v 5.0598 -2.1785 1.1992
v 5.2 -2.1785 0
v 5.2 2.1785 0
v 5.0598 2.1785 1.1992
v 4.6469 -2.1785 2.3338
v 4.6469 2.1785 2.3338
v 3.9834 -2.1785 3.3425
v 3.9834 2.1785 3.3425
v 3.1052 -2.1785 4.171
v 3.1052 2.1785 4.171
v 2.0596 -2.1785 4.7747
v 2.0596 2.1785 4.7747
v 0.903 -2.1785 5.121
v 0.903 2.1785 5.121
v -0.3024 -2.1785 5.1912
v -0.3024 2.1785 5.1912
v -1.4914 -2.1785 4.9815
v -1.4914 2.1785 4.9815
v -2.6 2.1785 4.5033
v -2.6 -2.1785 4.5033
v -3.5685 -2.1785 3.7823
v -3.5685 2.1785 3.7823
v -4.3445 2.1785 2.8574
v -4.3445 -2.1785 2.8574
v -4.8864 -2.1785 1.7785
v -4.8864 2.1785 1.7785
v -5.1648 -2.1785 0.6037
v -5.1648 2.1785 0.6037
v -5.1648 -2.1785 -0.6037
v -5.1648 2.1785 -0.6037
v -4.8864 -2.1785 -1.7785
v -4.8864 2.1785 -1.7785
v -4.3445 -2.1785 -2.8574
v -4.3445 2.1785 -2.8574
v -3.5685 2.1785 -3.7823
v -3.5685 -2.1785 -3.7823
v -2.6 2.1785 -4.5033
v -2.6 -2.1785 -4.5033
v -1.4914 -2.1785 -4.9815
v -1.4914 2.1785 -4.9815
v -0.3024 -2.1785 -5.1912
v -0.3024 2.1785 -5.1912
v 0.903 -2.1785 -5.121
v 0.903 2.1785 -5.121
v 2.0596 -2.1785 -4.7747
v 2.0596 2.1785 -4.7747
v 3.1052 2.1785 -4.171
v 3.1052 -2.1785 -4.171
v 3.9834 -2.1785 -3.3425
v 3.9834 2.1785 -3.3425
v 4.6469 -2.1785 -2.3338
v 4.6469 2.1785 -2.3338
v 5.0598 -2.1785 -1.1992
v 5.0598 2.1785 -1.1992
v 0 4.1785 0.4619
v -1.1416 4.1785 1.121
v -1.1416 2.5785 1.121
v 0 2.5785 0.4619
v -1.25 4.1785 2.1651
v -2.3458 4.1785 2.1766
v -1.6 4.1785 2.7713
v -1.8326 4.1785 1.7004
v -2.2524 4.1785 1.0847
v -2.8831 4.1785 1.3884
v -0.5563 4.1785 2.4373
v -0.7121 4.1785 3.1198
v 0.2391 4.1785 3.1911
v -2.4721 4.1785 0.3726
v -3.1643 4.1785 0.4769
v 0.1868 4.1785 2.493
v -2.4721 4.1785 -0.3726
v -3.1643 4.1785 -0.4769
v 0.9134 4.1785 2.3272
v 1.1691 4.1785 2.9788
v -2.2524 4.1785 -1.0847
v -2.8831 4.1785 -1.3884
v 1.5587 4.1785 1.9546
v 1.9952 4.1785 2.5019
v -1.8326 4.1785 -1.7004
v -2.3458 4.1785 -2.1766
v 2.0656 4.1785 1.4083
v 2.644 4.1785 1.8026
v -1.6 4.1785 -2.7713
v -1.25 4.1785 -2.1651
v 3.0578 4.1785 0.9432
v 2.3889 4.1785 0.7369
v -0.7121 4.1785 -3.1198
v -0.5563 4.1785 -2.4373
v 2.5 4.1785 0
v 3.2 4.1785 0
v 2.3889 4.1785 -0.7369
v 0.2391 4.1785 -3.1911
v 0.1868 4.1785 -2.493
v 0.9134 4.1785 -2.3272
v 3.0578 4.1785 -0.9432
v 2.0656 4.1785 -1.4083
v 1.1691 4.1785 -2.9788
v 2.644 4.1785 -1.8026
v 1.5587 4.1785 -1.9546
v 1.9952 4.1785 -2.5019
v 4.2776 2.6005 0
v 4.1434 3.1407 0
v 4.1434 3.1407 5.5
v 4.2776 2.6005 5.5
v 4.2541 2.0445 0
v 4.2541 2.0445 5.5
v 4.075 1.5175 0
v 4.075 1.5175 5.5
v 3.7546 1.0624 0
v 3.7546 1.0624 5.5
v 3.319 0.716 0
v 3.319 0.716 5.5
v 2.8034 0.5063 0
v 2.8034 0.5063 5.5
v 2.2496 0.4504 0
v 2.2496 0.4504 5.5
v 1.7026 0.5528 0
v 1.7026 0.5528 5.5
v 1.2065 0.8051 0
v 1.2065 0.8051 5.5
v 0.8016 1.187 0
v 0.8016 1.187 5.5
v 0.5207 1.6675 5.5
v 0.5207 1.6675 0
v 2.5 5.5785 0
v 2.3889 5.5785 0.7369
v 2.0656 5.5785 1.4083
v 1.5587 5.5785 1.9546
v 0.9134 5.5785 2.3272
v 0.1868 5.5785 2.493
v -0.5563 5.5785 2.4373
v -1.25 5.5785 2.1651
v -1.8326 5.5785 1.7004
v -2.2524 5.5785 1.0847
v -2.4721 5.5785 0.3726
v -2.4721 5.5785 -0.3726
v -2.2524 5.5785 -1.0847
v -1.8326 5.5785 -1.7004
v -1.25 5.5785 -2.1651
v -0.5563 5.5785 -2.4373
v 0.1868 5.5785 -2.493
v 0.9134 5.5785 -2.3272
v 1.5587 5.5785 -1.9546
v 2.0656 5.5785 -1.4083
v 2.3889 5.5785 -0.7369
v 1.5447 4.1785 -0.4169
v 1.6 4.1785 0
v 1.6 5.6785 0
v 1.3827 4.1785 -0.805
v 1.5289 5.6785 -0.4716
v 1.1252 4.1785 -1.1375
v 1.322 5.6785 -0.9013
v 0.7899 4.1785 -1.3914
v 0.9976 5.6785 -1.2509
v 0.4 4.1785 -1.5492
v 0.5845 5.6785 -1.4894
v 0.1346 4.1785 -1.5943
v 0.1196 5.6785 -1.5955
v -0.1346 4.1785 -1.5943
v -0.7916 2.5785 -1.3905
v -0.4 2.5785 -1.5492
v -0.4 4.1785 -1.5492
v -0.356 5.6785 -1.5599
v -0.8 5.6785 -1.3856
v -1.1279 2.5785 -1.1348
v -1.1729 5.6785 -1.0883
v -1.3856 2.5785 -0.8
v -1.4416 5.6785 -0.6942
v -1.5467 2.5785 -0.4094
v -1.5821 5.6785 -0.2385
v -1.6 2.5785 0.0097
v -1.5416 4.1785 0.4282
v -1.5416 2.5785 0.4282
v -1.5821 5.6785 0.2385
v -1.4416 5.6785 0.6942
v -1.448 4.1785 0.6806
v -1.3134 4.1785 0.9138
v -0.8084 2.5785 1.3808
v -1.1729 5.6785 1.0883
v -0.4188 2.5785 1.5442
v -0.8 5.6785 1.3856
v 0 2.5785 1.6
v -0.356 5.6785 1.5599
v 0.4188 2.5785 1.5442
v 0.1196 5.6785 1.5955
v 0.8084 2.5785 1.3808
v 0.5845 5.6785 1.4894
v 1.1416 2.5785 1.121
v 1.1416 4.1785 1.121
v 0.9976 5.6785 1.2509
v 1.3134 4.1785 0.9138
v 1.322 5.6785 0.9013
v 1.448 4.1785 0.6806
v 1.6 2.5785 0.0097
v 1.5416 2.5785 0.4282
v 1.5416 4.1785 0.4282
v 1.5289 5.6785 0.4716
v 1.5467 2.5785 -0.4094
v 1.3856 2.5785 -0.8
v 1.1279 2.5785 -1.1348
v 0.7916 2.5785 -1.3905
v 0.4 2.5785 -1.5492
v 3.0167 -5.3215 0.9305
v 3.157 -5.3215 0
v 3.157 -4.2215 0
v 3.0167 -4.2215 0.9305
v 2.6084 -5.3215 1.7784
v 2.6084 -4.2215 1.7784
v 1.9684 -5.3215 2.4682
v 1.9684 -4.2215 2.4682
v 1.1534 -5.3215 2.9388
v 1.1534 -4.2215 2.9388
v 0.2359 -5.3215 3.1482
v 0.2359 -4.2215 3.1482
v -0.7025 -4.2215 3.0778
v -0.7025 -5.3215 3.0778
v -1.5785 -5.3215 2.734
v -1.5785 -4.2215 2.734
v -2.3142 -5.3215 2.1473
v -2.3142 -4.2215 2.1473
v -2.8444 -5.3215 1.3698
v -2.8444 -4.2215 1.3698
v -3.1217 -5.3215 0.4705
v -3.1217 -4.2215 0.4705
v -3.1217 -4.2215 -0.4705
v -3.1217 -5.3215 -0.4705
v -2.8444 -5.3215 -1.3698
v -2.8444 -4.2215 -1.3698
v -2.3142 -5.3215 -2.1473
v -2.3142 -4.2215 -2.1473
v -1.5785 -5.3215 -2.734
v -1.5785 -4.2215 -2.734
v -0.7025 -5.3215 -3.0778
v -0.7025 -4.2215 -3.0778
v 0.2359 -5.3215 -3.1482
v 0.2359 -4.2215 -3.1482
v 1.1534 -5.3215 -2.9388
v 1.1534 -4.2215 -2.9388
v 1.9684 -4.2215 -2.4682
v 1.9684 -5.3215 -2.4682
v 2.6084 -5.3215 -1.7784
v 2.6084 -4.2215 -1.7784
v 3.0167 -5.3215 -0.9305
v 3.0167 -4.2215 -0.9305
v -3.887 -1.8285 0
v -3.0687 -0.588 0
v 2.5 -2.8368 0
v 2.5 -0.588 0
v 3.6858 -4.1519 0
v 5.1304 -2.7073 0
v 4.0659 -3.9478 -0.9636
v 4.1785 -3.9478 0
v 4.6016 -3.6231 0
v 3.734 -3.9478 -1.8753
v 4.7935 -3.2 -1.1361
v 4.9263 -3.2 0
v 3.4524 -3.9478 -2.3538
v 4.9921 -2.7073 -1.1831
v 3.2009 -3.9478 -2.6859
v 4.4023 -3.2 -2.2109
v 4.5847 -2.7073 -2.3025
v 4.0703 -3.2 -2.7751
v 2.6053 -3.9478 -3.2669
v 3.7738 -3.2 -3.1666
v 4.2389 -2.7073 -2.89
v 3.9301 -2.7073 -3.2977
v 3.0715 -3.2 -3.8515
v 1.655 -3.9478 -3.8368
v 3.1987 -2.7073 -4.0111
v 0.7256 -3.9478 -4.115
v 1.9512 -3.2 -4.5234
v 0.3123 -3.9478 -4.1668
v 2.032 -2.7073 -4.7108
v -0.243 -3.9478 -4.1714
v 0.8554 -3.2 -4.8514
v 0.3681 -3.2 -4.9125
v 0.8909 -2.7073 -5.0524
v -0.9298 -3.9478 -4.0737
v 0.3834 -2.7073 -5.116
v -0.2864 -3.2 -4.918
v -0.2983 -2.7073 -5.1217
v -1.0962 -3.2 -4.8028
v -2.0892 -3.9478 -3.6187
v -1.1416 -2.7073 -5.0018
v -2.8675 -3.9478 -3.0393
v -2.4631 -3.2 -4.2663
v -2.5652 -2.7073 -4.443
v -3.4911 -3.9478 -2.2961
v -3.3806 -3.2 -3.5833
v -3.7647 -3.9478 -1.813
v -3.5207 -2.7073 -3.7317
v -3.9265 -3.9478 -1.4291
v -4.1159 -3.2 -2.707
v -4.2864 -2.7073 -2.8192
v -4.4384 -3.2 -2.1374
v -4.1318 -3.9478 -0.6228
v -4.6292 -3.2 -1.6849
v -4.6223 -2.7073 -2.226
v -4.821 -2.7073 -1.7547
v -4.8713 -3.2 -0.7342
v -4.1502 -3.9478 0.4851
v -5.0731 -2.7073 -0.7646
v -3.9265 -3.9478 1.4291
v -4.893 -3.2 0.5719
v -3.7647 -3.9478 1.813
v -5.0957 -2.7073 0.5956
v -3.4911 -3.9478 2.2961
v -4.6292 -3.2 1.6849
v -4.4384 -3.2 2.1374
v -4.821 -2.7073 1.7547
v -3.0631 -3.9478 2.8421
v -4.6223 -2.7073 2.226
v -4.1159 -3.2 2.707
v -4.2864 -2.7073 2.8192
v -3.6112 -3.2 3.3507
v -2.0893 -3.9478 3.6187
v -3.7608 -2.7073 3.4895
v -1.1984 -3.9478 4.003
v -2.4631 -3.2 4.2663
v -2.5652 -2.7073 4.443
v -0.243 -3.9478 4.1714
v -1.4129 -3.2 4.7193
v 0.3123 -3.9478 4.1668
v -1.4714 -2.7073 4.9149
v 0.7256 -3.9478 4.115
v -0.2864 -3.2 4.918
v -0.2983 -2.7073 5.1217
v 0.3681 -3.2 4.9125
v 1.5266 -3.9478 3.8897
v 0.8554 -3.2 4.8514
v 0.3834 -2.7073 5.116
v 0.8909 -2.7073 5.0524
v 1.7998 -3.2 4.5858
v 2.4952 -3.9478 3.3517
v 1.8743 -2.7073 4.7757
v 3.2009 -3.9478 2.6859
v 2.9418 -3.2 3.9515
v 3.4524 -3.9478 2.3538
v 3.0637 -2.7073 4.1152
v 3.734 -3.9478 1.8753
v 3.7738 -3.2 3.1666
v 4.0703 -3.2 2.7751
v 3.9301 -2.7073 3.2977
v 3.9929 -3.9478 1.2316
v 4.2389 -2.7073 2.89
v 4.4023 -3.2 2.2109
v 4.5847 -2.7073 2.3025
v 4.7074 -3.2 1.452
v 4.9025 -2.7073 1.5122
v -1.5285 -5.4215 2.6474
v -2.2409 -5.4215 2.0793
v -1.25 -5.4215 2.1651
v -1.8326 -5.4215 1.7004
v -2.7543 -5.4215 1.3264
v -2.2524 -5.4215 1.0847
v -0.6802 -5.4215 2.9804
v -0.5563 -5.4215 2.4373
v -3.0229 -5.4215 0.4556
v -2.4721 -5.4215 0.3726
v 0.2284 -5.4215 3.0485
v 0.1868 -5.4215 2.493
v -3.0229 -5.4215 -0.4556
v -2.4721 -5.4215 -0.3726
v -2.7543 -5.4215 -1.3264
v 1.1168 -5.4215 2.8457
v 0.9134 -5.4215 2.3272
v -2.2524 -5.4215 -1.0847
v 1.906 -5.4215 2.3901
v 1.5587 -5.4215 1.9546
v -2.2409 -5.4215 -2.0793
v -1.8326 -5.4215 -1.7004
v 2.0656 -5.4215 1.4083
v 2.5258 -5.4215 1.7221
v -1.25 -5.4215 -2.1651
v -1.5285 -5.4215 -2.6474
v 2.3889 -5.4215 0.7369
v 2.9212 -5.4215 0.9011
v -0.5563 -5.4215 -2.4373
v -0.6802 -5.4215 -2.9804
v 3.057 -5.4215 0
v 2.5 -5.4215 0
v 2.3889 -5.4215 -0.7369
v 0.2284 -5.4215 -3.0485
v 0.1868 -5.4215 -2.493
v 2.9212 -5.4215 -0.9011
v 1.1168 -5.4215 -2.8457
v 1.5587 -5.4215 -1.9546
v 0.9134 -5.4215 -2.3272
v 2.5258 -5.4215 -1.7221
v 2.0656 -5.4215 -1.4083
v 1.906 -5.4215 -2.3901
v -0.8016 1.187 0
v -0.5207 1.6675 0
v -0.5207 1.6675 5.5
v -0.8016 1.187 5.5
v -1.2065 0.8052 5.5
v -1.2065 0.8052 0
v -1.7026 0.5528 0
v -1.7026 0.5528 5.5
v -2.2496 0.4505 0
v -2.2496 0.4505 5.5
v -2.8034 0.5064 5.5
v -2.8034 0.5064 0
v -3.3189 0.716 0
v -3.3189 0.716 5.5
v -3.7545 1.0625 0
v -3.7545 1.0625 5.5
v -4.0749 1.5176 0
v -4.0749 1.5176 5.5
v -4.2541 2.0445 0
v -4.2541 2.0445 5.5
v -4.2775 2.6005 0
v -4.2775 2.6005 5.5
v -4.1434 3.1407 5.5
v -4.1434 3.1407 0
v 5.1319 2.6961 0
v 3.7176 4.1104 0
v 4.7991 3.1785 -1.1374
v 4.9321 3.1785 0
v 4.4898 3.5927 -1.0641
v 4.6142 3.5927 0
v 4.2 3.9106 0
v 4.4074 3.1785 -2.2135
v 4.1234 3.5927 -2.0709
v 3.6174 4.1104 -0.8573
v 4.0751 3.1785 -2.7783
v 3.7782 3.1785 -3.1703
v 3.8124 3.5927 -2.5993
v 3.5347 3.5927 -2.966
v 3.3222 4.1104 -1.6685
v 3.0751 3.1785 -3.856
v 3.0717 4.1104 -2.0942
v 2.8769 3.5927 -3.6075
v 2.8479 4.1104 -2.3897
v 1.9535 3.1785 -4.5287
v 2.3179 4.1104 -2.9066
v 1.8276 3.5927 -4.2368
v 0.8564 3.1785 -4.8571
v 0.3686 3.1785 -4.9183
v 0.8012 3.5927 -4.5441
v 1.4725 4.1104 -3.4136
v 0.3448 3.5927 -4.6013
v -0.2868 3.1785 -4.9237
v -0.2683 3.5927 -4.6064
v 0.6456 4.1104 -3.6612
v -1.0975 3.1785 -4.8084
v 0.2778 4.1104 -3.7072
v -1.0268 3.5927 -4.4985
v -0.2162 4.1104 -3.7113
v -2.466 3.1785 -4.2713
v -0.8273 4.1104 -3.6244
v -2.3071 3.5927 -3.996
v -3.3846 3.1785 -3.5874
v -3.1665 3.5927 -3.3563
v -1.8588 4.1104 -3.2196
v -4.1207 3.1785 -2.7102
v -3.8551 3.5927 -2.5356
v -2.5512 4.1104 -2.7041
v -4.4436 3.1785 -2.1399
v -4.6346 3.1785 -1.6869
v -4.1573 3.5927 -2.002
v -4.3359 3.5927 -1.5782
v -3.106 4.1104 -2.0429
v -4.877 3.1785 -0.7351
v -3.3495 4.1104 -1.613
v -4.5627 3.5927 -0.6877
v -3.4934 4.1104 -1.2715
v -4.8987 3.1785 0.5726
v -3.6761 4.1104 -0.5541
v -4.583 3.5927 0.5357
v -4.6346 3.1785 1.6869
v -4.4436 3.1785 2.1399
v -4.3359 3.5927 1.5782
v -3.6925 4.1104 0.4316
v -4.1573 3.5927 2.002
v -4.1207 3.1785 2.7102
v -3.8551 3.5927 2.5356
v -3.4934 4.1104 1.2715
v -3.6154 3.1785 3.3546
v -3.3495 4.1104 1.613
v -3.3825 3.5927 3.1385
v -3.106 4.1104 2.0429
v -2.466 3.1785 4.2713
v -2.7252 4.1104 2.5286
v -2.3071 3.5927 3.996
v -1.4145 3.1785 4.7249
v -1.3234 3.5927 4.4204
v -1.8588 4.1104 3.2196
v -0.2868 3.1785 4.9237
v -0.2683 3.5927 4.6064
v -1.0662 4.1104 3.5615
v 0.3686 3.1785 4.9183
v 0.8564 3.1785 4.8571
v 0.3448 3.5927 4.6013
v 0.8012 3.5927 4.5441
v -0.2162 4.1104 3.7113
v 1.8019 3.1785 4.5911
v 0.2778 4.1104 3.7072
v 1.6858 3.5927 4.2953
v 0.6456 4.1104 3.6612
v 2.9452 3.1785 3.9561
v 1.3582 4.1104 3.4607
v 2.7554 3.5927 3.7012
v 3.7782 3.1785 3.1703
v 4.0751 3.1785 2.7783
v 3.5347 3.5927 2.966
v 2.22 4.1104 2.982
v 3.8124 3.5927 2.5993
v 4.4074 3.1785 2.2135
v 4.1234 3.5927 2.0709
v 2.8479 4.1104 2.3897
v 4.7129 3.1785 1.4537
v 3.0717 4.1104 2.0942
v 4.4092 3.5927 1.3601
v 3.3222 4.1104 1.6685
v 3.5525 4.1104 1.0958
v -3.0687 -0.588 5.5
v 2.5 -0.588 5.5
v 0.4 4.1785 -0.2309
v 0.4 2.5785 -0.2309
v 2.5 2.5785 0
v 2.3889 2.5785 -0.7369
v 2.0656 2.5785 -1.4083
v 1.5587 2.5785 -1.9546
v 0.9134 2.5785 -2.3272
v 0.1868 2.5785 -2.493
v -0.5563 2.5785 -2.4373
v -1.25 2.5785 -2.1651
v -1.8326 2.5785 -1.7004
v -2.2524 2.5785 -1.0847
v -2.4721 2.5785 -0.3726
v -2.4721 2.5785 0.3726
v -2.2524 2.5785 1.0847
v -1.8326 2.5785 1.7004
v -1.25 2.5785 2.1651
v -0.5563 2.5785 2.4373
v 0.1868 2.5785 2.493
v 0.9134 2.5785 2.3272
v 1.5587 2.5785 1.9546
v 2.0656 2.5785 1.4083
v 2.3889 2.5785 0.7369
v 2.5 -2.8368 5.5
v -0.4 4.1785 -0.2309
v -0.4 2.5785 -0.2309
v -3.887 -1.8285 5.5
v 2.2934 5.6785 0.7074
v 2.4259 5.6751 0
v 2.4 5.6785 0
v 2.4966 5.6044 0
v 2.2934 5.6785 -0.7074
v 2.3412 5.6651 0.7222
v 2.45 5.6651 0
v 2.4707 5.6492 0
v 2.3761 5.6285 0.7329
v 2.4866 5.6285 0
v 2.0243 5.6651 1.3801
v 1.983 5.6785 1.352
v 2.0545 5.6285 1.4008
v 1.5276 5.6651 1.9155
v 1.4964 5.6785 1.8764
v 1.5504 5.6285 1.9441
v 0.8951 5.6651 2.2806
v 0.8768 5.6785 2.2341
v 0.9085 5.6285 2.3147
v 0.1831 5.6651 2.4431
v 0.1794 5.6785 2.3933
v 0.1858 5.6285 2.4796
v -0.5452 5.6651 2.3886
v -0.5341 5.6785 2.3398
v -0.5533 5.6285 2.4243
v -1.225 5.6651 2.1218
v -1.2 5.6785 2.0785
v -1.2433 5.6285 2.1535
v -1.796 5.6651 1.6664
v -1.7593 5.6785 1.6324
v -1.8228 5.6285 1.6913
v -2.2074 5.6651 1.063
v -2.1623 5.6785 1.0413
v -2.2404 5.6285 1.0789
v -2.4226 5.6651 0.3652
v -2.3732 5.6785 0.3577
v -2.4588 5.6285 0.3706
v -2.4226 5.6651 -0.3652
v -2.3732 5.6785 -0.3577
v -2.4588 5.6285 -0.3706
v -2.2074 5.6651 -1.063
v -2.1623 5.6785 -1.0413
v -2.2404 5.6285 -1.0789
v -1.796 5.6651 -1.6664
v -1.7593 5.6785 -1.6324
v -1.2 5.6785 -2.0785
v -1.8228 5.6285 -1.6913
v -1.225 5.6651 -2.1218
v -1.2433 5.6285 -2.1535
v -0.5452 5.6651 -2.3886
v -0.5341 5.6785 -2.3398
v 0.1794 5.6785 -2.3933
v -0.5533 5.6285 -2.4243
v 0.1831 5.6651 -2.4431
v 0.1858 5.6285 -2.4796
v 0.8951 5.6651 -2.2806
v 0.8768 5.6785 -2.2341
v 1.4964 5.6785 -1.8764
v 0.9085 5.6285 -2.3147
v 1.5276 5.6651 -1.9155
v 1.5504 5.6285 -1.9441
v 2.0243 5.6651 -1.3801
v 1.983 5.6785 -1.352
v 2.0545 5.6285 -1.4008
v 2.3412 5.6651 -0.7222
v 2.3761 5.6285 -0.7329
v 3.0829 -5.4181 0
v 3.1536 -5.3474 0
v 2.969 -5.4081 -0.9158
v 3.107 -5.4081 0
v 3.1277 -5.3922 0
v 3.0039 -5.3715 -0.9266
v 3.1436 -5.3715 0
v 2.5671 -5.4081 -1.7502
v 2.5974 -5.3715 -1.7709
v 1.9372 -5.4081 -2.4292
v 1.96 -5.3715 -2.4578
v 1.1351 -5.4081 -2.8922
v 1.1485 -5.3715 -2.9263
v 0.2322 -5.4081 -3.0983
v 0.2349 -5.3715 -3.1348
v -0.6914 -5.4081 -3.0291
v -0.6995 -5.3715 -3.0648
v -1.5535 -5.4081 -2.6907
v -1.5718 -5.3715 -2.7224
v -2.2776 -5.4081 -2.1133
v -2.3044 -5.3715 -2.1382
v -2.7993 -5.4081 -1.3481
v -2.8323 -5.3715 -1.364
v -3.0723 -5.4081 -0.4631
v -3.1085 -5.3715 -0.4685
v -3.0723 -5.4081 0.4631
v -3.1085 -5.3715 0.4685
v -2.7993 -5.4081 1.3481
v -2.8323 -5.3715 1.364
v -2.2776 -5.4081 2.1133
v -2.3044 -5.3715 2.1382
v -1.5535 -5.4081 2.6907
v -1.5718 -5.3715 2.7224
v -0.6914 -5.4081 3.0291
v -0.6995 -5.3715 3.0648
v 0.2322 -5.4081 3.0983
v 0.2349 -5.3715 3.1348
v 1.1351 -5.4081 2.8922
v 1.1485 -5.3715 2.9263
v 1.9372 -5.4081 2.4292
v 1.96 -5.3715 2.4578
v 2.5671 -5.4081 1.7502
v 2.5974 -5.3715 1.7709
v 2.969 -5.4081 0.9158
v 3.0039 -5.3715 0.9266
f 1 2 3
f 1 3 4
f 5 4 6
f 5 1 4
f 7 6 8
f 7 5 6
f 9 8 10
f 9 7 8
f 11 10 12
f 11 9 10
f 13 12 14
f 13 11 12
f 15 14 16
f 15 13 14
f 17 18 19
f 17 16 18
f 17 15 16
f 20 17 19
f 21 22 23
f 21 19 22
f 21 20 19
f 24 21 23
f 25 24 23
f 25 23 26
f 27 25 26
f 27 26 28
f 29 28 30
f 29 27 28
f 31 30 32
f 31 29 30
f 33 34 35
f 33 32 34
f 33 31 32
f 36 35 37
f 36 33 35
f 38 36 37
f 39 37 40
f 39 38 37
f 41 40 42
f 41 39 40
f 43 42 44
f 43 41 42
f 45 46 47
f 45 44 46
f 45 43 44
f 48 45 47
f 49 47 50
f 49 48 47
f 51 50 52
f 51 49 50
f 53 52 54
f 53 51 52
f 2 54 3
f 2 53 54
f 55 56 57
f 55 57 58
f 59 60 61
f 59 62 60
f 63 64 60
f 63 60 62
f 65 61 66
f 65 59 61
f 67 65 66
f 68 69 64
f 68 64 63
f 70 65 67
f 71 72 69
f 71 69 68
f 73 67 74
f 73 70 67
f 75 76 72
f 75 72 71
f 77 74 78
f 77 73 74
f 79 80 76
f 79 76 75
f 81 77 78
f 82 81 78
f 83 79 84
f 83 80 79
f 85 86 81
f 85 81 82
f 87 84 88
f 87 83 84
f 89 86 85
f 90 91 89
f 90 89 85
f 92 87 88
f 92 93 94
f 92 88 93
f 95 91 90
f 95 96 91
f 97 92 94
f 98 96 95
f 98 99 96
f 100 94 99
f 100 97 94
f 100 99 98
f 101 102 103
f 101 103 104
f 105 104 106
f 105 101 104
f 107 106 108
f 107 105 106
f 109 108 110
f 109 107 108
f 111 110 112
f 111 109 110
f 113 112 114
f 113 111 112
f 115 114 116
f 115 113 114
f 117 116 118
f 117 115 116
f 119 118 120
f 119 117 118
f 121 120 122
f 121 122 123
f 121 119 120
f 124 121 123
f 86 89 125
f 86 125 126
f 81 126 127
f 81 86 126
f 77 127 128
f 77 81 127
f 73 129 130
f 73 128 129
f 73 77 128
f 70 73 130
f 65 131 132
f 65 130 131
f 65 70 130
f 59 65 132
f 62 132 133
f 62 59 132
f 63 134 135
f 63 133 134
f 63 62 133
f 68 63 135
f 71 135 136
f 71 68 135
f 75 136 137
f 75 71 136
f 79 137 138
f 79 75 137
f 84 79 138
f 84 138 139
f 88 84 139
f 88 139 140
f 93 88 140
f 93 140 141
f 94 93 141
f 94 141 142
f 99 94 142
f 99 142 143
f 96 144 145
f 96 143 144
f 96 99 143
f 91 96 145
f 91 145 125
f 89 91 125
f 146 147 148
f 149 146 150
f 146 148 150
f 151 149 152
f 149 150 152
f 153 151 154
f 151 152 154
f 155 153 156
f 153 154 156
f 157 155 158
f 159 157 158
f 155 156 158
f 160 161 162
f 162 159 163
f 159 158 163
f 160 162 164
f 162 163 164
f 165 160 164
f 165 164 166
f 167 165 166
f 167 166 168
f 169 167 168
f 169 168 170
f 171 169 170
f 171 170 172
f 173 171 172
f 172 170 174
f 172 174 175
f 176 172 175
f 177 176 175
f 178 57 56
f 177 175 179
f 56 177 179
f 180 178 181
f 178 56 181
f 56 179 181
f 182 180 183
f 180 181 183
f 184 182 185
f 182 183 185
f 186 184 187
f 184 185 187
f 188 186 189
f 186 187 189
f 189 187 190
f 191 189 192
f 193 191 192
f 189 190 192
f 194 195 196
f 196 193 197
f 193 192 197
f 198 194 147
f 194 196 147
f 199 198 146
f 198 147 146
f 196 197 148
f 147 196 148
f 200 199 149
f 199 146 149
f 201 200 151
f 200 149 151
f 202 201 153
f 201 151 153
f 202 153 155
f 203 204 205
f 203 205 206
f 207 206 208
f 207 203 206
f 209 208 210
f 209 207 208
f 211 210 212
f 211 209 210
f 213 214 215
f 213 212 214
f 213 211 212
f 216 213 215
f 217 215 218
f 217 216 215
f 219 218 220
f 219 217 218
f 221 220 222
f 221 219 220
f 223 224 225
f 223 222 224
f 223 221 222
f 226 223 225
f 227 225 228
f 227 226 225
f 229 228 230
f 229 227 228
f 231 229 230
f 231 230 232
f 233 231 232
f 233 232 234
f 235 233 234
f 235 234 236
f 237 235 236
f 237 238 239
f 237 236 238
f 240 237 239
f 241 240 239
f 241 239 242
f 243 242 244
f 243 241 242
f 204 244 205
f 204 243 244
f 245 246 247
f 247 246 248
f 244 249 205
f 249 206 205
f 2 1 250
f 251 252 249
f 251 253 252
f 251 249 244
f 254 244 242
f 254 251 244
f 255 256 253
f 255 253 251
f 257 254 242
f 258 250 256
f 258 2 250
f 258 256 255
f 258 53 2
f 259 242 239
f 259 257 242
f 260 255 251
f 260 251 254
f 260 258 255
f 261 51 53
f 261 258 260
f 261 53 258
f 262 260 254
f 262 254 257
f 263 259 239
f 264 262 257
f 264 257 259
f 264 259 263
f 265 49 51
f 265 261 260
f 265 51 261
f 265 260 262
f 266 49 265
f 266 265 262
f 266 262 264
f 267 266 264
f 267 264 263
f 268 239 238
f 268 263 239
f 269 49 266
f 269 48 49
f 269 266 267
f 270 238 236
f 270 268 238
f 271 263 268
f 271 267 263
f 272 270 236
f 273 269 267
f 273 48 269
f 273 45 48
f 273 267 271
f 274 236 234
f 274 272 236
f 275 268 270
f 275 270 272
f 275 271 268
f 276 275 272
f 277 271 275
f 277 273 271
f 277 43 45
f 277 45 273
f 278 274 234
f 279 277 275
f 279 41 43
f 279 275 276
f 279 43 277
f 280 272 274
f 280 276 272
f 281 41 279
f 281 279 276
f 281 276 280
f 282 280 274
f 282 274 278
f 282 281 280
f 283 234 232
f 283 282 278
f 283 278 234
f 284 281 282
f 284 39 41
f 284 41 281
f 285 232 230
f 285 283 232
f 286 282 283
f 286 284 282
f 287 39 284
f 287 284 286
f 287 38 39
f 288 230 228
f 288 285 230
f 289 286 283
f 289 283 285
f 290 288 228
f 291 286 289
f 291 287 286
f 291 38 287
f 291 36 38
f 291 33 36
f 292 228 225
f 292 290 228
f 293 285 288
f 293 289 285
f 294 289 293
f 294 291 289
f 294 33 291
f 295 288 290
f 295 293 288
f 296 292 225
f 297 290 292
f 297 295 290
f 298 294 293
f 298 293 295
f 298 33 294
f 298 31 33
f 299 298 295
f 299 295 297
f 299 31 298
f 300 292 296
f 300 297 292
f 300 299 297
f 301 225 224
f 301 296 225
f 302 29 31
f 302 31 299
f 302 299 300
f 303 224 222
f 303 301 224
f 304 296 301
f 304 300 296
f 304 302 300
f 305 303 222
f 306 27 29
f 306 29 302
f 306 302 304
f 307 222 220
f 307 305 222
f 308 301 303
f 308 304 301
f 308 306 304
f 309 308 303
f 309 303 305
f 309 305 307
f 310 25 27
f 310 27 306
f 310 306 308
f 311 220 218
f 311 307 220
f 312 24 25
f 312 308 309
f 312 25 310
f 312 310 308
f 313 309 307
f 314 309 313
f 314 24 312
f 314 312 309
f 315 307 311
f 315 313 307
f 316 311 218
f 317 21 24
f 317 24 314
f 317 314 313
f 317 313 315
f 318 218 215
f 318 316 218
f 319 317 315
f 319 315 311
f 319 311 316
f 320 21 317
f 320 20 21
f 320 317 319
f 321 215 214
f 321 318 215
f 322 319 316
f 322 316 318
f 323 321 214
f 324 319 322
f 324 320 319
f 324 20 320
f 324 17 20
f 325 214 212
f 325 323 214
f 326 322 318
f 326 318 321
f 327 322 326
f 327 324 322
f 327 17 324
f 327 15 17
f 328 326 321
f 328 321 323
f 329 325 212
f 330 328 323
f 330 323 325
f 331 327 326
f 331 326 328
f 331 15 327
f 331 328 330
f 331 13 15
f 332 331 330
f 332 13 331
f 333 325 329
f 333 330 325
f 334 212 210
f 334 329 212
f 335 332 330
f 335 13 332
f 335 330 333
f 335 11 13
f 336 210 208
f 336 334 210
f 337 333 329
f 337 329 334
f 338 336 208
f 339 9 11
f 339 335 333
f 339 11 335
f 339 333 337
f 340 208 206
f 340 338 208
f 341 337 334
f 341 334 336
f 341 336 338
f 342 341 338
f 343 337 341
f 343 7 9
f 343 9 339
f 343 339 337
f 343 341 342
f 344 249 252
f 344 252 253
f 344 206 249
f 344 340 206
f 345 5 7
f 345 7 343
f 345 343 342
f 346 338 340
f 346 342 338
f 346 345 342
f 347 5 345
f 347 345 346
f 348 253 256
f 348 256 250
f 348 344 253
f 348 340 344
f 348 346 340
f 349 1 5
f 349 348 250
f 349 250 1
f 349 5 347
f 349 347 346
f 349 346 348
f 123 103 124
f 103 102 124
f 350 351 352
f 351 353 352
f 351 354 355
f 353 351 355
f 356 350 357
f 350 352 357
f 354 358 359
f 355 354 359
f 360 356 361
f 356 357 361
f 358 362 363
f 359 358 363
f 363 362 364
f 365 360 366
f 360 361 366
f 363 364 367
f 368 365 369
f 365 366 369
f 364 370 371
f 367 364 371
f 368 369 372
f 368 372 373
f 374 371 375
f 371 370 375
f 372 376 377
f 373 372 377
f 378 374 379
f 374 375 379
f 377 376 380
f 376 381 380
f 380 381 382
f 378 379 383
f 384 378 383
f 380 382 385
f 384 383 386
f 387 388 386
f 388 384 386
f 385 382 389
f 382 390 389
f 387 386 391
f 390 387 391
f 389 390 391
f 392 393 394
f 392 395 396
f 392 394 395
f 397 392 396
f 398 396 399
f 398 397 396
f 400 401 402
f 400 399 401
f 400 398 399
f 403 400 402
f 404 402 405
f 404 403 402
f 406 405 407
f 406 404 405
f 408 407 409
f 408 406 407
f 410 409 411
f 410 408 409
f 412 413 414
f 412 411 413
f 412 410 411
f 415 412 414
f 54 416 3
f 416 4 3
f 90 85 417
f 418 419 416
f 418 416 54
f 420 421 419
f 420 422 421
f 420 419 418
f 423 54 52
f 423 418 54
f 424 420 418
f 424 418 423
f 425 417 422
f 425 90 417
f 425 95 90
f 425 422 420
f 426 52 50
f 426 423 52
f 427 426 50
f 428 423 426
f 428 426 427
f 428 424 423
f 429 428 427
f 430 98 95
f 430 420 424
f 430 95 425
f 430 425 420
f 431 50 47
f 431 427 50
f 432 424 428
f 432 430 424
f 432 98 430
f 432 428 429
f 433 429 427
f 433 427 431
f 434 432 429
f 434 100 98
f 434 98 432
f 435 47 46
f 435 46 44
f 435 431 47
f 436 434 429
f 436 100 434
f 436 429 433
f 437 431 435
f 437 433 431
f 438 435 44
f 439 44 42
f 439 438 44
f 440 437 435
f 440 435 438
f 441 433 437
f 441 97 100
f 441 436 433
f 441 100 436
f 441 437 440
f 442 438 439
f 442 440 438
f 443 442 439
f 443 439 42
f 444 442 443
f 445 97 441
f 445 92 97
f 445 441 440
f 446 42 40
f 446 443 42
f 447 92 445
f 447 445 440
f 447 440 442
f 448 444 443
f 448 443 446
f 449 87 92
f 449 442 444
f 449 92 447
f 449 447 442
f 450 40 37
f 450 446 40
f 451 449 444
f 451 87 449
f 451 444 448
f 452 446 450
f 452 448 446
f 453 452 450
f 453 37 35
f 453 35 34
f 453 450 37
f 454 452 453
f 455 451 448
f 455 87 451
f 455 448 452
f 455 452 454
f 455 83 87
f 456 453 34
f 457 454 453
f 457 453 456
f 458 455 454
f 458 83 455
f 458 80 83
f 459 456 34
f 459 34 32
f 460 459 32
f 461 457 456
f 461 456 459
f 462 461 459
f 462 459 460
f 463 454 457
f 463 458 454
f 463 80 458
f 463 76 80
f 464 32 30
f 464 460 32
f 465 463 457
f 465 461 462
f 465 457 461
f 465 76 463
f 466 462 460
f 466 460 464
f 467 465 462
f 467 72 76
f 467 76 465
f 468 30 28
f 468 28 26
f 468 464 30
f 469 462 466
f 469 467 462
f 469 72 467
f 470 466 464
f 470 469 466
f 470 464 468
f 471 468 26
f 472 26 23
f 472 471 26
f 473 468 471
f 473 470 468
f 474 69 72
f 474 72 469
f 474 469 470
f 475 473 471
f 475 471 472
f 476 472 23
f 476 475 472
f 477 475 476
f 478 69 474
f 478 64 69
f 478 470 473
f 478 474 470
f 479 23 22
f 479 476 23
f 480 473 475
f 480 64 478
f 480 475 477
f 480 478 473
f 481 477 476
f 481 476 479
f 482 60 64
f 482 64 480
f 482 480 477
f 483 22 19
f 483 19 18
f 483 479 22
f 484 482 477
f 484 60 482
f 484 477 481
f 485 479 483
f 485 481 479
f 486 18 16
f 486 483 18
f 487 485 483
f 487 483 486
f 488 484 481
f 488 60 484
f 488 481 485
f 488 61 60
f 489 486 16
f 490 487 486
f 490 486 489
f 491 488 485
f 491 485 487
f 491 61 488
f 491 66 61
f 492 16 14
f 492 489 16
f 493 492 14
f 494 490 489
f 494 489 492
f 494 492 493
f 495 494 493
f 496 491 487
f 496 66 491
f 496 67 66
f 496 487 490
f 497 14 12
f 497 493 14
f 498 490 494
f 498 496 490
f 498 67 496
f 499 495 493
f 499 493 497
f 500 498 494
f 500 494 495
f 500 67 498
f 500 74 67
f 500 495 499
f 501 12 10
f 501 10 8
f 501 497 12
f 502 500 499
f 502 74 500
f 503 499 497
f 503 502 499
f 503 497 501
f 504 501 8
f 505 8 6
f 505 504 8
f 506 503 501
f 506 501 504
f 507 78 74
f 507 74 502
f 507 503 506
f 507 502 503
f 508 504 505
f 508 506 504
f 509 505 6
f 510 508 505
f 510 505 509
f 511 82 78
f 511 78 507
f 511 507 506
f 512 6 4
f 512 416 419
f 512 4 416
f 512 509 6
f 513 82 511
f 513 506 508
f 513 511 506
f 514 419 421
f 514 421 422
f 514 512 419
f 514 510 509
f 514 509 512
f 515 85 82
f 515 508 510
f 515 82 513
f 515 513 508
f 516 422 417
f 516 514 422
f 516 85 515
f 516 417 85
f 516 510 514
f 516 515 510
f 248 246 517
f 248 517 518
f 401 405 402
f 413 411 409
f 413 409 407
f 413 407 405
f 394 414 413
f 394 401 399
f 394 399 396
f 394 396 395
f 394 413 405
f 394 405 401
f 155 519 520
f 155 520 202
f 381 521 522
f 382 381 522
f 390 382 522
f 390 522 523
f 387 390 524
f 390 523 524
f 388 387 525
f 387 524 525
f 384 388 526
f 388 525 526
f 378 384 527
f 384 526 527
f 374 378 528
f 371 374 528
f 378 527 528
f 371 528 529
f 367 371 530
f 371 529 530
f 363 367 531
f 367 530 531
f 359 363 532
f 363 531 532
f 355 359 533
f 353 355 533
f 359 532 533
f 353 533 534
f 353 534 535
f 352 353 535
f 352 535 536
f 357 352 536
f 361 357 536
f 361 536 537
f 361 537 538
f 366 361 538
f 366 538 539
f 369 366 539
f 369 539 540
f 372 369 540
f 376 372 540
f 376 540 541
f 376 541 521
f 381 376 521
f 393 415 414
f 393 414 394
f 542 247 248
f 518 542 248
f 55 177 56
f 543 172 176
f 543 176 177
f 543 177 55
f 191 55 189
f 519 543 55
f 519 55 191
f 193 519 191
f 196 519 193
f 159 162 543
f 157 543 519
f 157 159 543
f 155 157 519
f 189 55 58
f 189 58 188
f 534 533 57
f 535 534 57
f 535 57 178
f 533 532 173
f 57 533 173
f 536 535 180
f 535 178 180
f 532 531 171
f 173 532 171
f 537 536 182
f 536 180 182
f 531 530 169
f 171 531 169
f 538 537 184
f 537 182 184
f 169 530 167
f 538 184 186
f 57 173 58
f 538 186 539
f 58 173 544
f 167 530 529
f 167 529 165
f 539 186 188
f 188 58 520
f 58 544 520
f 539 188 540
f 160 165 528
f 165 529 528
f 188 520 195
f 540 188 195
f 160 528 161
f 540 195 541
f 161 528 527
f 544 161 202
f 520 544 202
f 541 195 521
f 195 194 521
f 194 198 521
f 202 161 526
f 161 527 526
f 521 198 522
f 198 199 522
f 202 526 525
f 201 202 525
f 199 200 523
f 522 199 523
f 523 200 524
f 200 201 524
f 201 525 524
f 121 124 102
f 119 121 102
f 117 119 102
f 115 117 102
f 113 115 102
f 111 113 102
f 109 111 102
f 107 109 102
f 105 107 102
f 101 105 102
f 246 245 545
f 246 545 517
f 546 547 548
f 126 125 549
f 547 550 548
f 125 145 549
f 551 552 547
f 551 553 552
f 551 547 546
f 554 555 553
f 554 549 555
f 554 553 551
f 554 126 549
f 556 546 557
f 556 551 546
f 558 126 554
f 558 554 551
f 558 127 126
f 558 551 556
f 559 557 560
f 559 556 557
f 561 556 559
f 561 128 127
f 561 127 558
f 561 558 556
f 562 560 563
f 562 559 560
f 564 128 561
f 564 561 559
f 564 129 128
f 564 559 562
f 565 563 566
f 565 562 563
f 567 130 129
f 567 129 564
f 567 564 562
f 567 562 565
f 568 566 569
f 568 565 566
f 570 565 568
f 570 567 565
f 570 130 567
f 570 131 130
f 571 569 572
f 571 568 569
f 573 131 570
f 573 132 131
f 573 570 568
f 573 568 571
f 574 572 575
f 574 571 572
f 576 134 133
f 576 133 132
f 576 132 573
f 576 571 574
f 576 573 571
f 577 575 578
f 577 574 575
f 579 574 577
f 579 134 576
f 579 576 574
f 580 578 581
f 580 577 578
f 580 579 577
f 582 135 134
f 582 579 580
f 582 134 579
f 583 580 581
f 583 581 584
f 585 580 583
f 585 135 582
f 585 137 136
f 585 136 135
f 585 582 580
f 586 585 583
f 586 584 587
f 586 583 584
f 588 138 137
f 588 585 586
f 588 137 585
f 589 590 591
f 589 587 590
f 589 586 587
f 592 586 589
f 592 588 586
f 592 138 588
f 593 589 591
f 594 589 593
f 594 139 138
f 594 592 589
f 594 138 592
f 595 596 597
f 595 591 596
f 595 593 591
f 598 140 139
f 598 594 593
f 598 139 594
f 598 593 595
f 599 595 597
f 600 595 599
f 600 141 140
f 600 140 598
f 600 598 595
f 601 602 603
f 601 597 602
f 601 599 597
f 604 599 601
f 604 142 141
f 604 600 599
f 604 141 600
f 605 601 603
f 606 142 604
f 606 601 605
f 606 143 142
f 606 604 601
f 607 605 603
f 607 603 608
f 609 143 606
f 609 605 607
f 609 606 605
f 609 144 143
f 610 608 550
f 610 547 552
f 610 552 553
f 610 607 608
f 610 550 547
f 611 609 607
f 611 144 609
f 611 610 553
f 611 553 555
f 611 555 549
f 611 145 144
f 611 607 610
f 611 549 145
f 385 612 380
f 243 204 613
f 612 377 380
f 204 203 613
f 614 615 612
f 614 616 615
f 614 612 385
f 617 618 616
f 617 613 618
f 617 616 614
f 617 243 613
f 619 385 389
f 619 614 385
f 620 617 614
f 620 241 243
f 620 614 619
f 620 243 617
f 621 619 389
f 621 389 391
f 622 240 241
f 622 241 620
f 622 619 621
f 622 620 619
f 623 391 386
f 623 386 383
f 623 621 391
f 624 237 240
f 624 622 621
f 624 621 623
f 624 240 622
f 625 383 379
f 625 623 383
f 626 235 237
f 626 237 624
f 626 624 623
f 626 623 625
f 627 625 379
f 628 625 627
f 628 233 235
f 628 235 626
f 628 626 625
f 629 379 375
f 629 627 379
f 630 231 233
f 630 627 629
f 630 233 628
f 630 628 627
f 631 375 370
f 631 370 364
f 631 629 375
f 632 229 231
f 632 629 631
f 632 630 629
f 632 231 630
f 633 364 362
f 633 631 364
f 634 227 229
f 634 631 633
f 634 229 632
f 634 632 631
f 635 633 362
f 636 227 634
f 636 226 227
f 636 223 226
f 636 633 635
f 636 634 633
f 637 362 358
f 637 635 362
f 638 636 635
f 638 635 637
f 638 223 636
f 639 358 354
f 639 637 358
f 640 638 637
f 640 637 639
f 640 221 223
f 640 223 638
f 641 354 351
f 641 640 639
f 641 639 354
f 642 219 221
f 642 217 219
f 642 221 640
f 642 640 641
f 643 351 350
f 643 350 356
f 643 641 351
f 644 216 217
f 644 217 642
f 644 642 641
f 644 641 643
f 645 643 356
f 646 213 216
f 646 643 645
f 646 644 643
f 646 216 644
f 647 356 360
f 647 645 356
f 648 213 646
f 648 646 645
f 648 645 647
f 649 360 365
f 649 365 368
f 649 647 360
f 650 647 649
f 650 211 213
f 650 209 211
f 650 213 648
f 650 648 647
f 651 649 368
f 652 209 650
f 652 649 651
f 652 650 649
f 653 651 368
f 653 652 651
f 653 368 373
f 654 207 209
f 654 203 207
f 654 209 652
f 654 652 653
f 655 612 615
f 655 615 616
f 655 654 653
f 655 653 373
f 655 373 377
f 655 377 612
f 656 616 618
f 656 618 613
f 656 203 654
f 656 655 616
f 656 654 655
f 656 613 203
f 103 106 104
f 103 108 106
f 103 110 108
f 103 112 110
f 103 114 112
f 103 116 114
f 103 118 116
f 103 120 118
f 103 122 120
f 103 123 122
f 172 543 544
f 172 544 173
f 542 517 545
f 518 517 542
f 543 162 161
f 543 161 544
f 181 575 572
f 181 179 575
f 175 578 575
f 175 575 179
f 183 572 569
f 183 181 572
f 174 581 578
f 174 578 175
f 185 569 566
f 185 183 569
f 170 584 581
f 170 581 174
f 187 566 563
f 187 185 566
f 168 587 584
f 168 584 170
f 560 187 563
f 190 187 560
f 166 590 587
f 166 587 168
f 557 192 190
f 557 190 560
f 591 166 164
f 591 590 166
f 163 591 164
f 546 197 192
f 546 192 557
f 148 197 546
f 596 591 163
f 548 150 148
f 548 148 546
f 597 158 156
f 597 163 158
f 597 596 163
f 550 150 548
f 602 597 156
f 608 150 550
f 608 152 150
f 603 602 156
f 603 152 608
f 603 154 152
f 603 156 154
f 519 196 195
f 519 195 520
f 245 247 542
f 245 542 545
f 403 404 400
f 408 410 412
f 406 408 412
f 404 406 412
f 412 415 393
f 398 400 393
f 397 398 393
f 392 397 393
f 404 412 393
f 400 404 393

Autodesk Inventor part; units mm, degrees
ref_plane "XZ Plane" through (0, 0, 0) normal (0, 1, 0) x (-1, 0, 0)
sketch "Sketch2" plane through (0, 0, 0) normal (0, 0, 1) x (1, 0, 0)
  line L0 (0, 4.1785) -> (1.6, 4.1785)
  line L1 (1.6, 4.1785) -> (1.6, 5.6785)
  line L2 (1.6, 5.6785) -> (2.5, 5.6785)
  line L3 (2.5, 5.6785) -> (2.5, 4.1785)
  line L4 (2.5, 4.1785) -> (3.2, 4.1785)
  arc A0 (5.2, 2.1785) -> (3.2, 4.1785) centre (3.2, 2.1785) ccw
  line L5 (5.2, 2.1785) -> (5.2, -2.1785)
  arc A1 (3.157, -4.2215) -> (5.2, -2.1785) centre (3.157, -2.1785) ccw
  line L6 (3.157, -4.2215) -> (3.157, -5.4215)
  line L7 (3.157, -5.4215) -> (2.5, -5.4215)
  line L8 (2.5, -5.4215) -> (2.5, 2.5785)
  line L9 (2.5, 2.5785) -> (0, 2.5785)
  line L10 (0, 2.5785) -> (0, 4.1785)
  point P0 (0, 0)
  point P1 (5.2, 0)
  dimension "d0" = 5
  dimension "d1" = 3.2
  dimension "d2" = 1.5
  dimension "d3" = 2
  dimension "d4" = 10.4
  dimension "d6" = 6.314
  dimension "d7" = 1.2
  dimension "d8" = 8
  dimension "d23" = 9.6
revolve "Revolution1" add sketch "Sketch2" angle 360 about axis through (0, 2.5785, 0) along (0, 1, 0)
sketch "Sketch3" plane through (0, 4.1785, 0) normal (0, 1, 0) x (1, 0, 0)
  circle A0 centre (0, 0) radius 1.6 projected
  line L0 (-0.4, 1.5492) -> (-0.4, 0.2309)
  line L1 (-0.4, 0.2309) -> (-1.5416, -0.4282)
  line L2 (-1.1416, -1.121) -> (0, -0.4619)
  line L3 (0, -0.4619) -> (1.1416, -1.121)
  line L4 (1.5416, -0.4282) -> (0.4, 0.2309)
  line L5 (0.4, 0.2309) -> (0.4, 1.5492)
  dimension "d10" = 120
  dimension "d11" = 0.8
extrude "Extrusion1" cut sketch "Sketch3" against normal through all contours A0 L4 L5 | L0 L1 A0 | A0 L2 L3
fillet "Fillet1" radius 0.1 2 edges at (-2.5, 5.6785, 0) (-3.157, -5.4215, 0)
ref_plane "Work Plane1" through (5.2, 0, 0) normal (1, 0, 0) x (0, 1, 0)
ref_plane "Work Plane2" through (0, 0, 5.2) normal (0, 0, 1) x (1, 0, 0)
sketch "草圖6" plane through (0, 0, 0) normal (0, 0, 1) x (1, 0, 0)
  line L0 (-4.1434, 3.1407) -> (-0.5207, 1.6675)
  arc A0 (-4.1434, 3.1407) -> (-0.5207, 1.6675) centre (-2.3321, 2.4041) ccw
  line L1 (0, 0) -> (0, 4.7535) construction
  line L2 (4.1434, 3.1407) -> (0.5207, 1.6675)
  arc A1 (0.5207, 1.6675) -> (4.1434, 3.1407) centre (2.3321, 2.4041) ccw
  line L3 (-3.0687, -0.588) -> (2.6358, -0.588)
  line L4 (2.5, -5.4215) -> (2.5, 2.5785) projected
  line L5 (2.6358, -0.588) -> (3.9705, -3.069)
  line L6 (3.9705, -3.069) -> (-3.887, -1.8285)
  line L7 (-3.887, -1.8285) -> (-3.0687, -0.588)
  point P0 (2.5, -2.8368)
  point P1 (2.5, -0.588)
split_face "分割1"
split_face "分割2"
split_face "分割3"
ref_plane "工作平面3" through (0, -0.3215, 0) normal (0, 1, 0) x (-0.9999, 0, -0.015)
extrude "擠出2" add sketch "草圖6" along normal blind 5.5 separate body contours L0 A0 | A1 L4 L2 | L4 L6 L7 L3 | L4 A1 L2
properties part number "X02598_LEGOmini_Head_Y_Original_NoPara" material "ABS Plastic"
